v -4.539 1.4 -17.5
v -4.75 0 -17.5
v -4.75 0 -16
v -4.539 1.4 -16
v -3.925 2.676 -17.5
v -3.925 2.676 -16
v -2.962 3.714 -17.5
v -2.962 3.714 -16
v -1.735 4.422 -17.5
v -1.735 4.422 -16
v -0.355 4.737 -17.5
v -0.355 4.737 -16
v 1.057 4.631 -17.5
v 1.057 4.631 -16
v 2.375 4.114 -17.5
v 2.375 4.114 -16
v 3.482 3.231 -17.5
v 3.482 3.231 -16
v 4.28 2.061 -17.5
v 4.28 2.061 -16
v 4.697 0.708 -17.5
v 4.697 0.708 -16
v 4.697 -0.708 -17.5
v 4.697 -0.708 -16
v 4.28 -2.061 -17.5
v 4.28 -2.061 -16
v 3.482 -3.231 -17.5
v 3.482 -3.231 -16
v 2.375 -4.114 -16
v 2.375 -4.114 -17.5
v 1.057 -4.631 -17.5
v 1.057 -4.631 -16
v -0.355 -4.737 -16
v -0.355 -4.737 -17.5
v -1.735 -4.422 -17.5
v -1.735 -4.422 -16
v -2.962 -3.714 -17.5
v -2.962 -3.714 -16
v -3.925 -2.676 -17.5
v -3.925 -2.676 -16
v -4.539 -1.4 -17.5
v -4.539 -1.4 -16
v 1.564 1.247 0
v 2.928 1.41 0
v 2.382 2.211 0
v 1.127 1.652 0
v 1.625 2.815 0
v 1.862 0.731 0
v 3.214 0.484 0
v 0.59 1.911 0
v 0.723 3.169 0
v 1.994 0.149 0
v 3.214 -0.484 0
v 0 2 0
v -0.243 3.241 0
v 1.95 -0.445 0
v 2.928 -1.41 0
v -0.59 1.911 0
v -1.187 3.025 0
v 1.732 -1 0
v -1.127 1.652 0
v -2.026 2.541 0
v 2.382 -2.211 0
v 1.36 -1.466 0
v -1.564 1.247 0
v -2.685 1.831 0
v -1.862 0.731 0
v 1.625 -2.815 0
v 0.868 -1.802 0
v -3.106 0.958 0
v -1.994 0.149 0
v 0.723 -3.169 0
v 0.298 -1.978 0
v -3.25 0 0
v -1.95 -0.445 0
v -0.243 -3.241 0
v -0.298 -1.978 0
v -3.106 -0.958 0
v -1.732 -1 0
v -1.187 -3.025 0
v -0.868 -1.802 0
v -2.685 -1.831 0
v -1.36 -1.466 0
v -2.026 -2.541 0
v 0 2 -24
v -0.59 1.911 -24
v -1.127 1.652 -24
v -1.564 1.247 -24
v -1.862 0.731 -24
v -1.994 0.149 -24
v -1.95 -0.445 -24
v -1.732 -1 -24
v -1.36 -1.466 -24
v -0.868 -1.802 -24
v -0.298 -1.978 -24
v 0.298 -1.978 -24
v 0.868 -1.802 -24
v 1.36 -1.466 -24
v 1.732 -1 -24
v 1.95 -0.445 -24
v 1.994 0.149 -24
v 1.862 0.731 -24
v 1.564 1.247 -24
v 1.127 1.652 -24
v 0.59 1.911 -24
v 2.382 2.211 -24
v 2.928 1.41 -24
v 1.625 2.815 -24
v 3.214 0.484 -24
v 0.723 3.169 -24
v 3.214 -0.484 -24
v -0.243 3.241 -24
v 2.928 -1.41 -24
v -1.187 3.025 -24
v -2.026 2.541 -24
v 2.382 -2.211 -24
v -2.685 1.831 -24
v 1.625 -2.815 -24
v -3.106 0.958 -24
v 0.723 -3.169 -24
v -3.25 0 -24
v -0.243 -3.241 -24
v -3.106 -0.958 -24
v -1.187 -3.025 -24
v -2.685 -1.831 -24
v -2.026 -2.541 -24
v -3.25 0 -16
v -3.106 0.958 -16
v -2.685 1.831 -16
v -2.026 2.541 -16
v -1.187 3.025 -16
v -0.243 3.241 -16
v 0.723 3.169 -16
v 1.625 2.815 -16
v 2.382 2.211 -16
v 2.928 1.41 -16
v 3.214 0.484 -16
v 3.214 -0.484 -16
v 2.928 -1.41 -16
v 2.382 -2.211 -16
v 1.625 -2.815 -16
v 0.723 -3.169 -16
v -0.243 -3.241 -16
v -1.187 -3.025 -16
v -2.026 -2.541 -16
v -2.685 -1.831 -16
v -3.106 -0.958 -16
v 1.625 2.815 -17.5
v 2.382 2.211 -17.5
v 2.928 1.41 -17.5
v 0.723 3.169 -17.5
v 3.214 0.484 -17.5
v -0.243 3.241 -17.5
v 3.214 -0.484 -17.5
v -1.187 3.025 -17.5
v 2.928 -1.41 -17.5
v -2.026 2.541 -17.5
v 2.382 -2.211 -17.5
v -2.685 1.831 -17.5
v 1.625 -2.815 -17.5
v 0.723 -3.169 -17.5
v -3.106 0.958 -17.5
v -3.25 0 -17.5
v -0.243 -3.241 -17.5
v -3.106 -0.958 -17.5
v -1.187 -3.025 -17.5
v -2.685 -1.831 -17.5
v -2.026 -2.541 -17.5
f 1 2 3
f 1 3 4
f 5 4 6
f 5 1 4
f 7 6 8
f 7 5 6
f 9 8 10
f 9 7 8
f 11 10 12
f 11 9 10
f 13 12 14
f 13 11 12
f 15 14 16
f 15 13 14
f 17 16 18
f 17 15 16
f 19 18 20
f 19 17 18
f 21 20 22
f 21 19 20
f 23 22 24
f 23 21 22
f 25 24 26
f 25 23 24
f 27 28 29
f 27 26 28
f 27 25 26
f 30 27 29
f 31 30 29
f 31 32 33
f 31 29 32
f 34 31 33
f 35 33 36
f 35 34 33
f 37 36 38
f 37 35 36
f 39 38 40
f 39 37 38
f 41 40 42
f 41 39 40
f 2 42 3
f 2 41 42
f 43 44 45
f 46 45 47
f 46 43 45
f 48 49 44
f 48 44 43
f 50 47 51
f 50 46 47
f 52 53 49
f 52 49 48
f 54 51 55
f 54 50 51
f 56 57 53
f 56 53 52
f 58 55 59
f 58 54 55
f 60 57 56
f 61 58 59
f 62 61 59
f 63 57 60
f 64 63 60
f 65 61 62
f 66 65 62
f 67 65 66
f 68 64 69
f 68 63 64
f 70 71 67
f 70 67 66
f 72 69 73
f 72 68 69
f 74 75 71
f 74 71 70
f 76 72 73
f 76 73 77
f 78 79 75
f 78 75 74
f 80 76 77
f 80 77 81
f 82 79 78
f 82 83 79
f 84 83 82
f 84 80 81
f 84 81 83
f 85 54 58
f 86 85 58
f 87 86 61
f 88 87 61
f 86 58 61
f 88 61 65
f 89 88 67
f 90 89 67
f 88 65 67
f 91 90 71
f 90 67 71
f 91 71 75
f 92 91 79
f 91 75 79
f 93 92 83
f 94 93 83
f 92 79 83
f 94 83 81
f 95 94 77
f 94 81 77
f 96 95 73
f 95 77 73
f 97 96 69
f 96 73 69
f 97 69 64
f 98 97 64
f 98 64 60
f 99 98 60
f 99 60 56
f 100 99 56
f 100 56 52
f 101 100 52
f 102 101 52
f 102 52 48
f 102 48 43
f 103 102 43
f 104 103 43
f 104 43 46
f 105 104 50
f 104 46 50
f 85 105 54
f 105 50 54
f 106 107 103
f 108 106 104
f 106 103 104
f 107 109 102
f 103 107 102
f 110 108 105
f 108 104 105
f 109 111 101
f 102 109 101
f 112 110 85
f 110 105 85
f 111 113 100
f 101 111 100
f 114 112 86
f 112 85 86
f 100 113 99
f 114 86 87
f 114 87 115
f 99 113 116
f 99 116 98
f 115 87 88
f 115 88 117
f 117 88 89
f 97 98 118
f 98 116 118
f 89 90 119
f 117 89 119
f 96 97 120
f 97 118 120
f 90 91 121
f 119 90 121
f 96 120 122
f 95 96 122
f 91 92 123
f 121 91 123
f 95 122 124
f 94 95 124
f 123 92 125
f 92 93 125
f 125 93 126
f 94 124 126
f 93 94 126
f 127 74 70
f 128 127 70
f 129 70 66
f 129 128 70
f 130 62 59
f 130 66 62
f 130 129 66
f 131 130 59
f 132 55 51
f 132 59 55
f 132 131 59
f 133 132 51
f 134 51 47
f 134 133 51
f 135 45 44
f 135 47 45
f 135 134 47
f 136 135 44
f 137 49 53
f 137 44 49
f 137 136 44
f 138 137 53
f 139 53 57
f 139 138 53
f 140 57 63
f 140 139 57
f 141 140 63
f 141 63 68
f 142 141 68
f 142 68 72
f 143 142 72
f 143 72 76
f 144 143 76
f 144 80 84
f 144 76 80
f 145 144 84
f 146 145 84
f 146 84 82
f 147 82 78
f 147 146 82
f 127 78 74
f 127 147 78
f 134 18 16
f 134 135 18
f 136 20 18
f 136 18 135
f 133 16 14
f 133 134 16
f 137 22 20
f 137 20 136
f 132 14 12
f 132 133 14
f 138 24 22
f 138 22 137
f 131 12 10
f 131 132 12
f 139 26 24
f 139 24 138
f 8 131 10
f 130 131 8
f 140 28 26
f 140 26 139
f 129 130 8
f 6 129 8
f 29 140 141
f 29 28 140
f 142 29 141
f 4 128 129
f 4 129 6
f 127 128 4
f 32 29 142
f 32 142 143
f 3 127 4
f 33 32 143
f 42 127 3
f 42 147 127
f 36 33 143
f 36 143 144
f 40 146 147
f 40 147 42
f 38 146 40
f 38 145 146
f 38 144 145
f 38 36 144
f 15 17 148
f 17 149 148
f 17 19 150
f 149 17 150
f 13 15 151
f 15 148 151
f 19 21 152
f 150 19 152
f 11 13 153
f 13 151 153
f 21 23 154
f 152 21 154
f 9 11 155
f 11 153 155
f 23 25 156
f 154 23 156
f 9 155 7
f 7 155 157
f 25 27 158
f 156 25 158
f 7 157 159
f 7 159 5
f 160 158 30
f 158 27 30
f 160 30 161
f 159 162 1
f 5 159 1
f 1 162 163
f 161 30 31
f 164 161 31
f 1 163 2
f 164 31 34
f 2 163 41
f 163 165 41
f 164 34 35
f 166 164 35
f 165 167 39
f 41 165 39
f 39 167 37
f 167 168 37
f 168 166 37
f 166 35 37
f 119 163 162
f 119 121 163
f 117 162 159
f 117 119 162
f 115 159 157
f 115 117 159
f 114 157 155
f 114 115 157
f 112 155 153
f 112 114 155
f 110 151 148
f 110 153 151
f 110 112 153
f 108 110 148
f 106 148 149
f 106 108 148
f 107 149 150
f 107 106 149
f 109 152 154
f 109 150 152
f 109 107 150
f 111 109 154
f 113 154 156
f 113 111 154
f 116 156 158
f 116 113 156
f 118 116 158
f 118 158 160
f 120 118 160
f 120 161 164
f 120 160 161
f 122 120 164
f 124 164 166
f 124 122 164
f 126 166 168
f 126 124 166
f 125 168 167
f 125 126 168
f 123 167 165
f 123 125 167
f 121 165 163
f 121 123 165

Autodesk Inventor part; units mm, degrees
ref_plane "YZ Plane" through (0, 0, 0) normal (1, 0, 0) x (0, 1, 0)
ref_plane "XZ Plane" through (0, 0, 0) normal (0, 1, 0) x (-1, 0, 0)
ref_plane "XY Plane" through (0, 0, 0) normal (0, 0, 1) x (1, 0, 0)
sketch "Skizze1" plane through (0, 0, 0) normal (0, 1, 0) x (-1, 0, 0)
  line L0 (0, 0) -> (3.25, 0)
  line L1 (3.25, 0) -> (3.25, -16)
  line L2 (3.25, -16) -> (4.75, -16)
  line L3 (4.75, -16) -> (4.75, -17.5)
  line L4 (4.75, -17.5) -> (3.25, -17.5)
  line L5 (3.25, -17.5) -> (3.25, -24)
  line L6 (3.25, -24) -> (0, -24)
  line L7 (0, -24) -> (0, 0)
  point P0 (4.75, -16.75)
  dimension "d0" = 6.5
  dimension "d1" = 9.5
  dimension "d2" = 16
  dimension "d3" = 1.5
  dimension "d4" = 6.5
revolve "Umdrehung1" add sketch "Skizze1" angle 360 about axis through (0, 0, -24) along (0, 0, 1)
sketch "Skizze2" plane through (0, 0, -24) normal (0, 0, -1) x (-1, 0, 0)
  circle A0 centre (0, 0) radius 3.25 projected
hole "Bohrung1" at (0, 0, -24) direction (0, 0, 1) diameter 4 depth 24
properties part number "07" material "Nylon 6/6"
